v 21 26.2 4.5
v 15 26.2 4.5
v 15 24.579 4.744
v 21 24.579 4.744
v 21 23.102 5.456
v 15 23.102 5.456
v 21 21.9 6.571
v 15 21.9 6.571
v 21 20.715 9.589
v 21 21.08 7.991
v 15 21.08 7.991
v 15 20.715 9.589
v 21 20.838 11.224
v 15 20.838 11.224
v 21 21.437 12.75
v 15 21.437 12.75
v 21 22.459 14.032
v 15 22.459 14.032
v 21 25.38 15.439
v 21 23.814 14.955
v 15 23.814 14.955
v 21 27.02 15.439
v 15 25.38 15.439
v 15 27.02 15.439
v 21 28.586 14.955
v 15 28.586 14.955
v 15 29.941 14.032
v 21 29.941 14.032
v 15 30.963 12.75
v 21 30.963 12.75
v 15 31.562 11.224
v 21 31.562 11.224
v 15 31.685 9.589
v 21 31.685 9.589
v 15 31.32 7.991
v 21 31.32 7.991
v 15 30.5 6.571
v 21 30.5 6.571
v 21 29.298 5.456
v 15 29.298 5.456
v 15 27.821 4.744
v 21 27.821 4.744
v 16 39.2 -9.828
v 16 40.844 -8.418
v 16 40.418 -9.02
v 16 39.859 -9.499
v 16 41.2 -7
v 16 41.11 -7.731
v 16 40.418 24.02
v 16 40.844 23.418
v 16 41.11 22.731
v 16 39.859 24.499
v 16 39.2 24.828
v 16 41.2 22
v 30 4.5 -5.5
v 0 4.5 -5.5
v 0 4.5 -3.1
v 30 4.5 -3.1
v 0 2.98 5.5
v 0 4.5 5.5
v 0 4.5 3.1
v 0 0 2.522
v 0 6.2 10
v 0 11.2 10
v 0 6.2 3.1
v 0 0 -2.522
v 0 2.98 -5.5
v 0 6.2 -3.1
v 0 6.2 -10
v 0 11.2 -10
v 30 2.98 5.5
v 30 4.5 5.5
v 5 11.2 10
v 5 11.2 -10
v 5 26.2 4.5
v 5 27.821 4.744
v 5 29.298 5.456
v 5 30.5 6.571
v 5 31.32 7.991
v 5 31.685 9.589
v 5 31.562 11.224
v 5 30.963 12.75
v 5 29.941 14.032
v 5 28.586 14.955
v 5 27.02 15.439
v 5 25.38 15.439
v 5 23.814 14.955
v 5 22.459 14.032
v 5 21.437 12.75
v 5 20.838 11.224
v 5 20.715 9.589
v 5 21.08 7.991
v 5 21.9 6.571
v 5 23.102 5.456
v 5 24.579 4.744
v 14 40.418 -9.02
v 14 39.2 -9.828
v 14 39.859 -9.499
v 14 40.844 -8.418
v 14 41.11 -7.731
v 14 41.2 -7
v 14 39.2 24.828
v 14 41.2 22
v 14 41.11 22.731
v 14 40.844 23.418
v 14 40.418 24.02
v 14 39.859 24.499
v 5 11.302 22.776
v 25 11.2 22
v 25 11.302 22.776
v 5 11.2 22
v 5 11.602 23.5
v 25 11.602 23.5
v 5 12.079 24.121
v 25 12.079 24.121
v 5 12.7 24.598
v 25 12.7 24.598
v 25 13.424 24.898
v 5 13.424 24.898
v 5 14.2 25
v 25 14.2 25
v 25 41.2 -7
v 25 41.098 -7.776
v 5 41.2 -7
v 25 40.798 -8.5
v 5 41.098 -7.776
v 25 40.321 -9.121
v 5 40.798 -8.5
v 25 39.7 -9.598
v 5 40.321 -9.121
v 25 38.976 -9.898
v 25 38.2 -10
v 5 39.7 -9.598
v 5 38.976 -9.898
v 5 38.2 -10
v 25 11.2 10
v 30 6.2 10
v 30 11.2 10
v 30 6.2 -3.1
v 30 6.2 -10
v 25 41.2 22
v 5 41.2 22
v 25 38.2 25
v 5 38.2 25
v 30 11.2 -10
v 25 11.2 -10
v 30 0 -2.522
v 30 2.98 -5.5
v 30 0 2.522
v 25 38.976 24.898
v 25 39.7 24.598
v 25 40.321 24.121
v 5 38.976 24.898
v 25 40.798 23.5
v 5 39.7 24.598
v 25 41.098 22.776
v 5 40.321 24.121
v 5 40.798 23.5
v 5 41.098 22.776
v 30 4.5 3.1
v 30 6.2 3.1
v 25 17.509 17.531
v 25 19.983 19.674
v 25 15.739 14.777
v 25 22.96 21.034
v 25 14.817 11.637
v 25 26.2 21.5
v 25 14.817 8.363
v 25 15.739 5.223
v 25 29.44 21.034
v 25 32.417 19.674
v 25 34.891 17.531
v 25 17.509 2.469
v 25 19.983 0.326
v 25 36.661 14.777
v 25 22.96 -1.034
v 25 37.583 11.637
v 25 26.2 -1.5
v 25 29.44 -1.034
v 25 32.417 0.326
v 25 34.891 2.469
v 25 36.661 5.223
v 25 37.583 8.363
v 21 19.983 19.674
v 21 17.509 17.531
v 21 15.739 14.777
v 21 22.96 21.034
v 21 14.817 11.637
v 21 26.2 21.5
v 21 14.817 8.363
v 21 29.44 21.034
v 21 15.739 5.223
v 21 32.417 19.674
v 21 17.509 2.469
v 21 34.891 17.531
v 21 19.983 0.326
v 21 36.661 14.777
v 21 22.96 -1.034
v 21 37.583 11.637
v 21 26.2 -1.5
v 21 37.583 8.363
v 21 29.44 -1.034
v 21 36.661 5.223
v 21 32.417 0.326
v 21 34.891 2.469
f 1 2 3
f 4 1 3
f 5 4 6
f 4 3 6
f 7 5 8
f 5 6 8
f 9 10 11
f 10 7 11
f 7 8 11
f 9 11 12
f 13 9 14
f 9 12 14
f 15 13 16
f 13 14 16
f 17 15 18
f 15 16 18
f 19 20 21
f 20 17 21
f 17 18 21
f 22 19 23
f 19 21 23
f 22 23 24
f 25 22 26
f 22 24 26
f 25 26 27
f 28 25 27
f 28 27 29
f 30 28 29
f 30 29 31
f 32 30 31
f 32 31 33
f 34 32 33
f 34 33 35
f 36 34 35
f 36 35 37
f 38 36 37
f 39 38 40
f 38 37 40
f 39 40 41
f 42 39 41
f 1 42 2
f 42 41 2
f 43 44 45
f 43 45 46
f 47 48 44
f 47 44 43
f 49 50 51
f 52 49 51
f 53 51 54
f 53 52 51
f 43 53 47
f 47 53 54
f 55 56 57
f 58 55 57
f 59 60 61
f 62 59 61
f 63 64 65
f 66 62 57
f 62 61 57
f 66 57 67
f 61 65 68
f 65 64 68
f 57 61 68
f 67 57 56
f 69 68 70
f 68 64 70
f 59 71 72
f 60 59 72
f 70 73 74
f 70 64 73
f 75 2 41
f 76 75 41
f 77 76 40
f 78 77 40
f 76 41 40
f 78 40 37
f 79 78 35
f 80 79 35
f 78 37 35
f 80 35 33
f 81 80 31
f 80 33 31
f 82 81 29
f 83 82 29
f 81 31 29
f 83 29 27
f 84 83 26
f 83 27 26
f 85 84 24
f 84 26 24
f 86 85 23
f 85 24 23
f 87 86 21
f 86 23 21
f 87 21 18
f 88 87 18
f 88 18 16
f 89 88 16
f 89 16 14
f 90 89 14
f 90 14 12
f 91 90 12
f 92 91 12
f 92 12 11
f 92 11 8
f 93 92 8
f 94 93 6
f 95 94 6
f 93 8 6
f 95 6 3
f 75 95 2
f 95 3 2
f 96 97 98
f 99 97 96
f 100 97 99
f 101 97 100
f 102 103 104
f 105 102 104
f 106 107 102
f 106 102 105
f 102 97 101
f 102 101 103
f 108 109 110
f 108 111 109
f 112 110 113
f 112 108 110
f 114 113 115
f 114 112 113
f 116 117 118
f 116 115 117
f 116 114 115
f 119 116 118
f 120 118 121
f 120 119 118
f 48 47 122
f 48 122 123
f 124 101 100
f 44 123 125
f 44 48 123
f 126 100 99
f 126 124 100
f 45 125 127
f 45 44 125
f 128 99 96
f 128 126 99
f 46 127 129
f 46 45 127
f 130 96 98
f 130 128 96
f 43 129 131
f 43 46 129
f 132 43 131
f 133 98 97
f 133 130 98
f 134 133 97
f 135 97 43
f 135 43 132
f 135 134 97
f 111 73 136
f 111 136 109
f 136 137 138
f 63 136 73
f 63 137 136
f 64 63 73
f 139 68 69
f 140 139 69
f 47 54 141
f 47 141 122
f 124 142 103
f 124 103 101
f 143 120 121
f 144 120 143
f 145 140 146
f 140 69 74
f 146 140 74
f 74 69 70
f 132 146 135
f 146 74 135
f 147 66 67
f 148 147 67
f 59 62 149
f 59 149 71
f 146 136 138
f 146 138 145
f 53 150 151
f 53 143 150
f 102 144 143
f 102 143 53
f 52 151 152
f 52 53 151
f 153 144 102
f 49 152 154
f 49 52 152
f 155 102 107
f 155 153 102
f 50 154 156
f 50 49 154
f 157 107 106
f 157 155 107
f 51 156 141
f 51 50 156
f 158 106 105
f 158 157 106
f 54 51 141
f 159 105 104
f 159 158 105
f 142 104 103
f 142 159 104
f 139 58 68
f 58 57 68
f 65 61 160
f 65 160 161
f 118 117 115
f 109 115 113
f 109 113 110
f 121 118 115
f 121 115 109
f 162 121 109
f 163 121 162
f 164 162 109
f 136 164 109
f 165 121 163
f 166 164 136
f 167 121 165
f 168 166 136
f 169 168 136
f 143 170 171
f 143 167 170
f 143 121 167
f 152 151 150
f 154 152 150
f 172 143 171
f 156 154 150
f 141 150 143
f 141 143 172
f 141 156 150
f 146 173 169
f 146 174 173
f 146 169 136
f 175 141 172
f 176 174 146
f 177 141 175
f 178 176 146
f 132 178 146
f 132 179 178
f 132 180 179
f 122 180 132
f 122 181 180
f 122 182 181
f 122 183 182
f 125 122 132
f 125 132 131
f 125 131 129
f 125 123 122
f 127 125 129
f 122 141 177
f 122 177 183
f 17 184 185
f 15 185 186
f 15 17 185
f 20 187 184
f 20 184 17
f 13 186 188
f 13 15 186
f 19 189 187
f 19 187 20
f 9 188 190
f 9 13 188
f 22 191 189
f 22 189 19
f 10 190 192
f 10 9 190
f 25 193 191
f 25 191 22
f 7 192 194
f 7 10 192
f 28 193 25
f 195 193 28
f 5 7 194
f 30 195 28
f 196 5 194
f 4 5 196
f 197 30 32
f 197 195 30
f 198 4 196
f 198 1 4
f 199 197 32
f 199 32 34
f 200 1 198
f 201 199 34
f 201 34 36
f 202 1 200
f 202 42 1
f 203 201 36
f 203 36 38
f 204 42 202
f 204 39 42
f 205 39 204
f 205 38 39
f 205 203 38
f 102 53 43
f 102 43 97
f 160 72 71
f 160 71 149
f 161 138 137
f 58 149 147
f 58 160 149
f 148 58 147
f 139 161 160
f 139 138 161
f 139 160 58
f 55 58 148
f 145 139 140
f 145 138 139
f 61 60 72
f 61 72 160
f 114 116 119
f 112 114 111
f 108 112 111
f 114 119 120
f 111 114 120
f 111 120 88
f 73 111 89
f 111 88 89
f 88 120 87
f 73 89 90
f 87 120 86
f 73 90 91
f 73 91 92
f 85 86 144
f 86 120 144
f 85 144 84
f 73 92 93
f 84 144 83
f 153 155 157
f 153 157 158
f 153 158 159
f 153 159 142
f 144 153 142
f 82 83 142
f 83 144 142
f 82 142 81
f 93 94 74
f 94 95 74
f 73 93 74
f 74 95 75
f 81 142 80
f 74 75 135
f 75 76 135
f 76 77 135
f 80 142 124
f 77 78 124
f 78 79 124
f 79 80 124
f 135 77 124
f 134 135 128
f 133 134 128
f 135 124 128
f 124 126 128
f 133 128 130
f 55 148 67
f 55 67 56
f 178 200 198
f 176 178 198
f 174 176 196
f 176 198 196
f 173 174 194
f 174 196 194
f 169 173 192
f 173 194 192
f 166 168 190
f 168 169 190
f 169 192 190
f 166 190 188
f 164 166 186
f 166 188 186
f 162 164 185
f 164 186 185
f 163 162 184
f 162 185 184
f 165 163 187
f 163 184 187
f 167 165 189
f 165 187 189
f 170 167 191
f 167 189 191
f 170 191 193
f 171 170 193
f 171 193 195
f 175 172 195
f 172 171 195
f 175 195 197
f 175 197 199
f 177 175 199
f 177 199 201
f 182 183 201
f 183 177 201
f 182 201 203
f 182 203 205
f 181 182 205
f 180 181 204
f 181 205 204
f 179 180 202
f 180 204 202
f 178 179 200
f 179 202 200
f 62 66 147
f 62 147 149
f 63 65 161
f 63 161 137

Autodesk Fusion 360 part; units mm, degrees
sketch "Sketch1" plane through (0, 0, 0) normal (1, 0, 0) x (0, 0, -1)
  line L0 (0, 0) -> (2.5225, 0)
  line L1 (2.5225, 0) -> (5.5, 2.98)
  line L2 (5.5, 2.98) -> (5.5, 4.5)
  line L3 (5.5, 4.5) -> (3.1, 4.5)
  line L4 (3.1, 4.5) -> (3.1, 6.2)
  line L5 (3.1, 6.2) -> (10, 6.2)
  line L6 (10, 6.2) -> (10, 11.2)
  line L7 (10, 11.2) -> (0, 11.2)
  line L8 (0, 0) -> (0, 21.3117) construction
  line L9 (-10, 6.2) -> (-10, 11.2)
  line L10 (0, 0) -> (-2.5225, 0)
  line L11 (-3.1, 6.2) -> (-10, 6.2)
  line L12 (-5.5, 2.98) -> (-5.5, 4.5)
  line L13 (-10, 11.2) -> (0, 11.2)
  line L14 (-5.5, 4.5) -> (-3.1, 4.5)
  line L15 (-2.5225, 0) -> (-5.5, 2.98)
  line L16 (-3.1, 4.5) -> (-3.1, 6.2)
  dimension "d3" = 2.5225
  dimension "d4" = 4.5
  dimension "d6" = 2.4
  dimension "d7" = 3.1
  dimension "d8" = 1.52
  dimension "d9" = 1.7
  dimension "d10" = 5
  dimension "d11" = 10
extrude "Extrude1" add sketch "Sketch1" along normal blind 30
ref_plane "WorkPlane1" through (15, 5.6, 0) normal (1, 0, 0) x (0, 0, -1)
sketch "Sketch2" plane through (15, 5.6, 0) normal (1, 0, 0) x (0, 0, -1)
  line L0 (10, 5.6) -> (-10, 5.6)
  line L1 (10, 5.6) -> (-22, 5.6)
  line L2 (-25, 8.6) -> (-25, 32.6)
  line L3 (-22, 35.6) -> (7, 35.6)
  line L4 (10, 32.6) -> (10, 5.6)
  circle A0 centre (-10, 20.6) radius 11.5
  line L5 (-25, 20.6) -> (10, 20.6) construction
  circle A1 centre (-10, 20.6) radius 5.5
  arc A2 (-22, 35.6) -> (-25, 32.6) centre (-22, 32.6) ccw
  arc A3 (10, 32.6) -> (7, 35.6) centre (7, 32.6) ccw
  arc A4 (-25, 8.6) -> (-22, 5.6) centre (-22, 8.6) ccw
  point P0 (-25, 5.6)
  point P1 (10, 35.6)
  dimension "d15" = 35
  dimension "d16" = 30
  dimension "d17" = 23
  dimension "d18" = 15
  dimension "d19" = 11
  dimension "d29" = 3
  dimension "d30" = 3
extrude "Extrude2" add sketch "Sketch2" along normal blind 10 and the other way blind 10 contours L0 L1 L2 L3 L4 A2 A3 A4
extrude "Extrude3" add sketch "Sketch2" against normal blind 10 and the other way blind 6 contours A0
sketch "Sketch3" plane through (0, 0, 25) normal (0, 0, 1) x (1, 0, 0)
  line L0 (5, 14.2) -> (25, 14.2)
  line L1 (25, 14.2) -> (25, 38.2)
  line L2 (25, 38.2) -> (5, 38.2)
  line L3 (5, 38.2) -> (5, 14.2)
  line L4 (25, 41.2) -> (5, 41.2)
  line L5 (14, 41.2) -> (16, 41.2)
  line L6 (16, 41.2) -> (16, 39.2)
  line L7 (16, 39.2) -> (14, 39.2)
  line L8 (14, 39.2) -> (14, 41.2)
  dimension "d31" = 2
  dimension "d32" = 2
extrude "Extrude4" cut sketch "Sketch3" against normal through all contours L4 L5 L6 L7 L8
